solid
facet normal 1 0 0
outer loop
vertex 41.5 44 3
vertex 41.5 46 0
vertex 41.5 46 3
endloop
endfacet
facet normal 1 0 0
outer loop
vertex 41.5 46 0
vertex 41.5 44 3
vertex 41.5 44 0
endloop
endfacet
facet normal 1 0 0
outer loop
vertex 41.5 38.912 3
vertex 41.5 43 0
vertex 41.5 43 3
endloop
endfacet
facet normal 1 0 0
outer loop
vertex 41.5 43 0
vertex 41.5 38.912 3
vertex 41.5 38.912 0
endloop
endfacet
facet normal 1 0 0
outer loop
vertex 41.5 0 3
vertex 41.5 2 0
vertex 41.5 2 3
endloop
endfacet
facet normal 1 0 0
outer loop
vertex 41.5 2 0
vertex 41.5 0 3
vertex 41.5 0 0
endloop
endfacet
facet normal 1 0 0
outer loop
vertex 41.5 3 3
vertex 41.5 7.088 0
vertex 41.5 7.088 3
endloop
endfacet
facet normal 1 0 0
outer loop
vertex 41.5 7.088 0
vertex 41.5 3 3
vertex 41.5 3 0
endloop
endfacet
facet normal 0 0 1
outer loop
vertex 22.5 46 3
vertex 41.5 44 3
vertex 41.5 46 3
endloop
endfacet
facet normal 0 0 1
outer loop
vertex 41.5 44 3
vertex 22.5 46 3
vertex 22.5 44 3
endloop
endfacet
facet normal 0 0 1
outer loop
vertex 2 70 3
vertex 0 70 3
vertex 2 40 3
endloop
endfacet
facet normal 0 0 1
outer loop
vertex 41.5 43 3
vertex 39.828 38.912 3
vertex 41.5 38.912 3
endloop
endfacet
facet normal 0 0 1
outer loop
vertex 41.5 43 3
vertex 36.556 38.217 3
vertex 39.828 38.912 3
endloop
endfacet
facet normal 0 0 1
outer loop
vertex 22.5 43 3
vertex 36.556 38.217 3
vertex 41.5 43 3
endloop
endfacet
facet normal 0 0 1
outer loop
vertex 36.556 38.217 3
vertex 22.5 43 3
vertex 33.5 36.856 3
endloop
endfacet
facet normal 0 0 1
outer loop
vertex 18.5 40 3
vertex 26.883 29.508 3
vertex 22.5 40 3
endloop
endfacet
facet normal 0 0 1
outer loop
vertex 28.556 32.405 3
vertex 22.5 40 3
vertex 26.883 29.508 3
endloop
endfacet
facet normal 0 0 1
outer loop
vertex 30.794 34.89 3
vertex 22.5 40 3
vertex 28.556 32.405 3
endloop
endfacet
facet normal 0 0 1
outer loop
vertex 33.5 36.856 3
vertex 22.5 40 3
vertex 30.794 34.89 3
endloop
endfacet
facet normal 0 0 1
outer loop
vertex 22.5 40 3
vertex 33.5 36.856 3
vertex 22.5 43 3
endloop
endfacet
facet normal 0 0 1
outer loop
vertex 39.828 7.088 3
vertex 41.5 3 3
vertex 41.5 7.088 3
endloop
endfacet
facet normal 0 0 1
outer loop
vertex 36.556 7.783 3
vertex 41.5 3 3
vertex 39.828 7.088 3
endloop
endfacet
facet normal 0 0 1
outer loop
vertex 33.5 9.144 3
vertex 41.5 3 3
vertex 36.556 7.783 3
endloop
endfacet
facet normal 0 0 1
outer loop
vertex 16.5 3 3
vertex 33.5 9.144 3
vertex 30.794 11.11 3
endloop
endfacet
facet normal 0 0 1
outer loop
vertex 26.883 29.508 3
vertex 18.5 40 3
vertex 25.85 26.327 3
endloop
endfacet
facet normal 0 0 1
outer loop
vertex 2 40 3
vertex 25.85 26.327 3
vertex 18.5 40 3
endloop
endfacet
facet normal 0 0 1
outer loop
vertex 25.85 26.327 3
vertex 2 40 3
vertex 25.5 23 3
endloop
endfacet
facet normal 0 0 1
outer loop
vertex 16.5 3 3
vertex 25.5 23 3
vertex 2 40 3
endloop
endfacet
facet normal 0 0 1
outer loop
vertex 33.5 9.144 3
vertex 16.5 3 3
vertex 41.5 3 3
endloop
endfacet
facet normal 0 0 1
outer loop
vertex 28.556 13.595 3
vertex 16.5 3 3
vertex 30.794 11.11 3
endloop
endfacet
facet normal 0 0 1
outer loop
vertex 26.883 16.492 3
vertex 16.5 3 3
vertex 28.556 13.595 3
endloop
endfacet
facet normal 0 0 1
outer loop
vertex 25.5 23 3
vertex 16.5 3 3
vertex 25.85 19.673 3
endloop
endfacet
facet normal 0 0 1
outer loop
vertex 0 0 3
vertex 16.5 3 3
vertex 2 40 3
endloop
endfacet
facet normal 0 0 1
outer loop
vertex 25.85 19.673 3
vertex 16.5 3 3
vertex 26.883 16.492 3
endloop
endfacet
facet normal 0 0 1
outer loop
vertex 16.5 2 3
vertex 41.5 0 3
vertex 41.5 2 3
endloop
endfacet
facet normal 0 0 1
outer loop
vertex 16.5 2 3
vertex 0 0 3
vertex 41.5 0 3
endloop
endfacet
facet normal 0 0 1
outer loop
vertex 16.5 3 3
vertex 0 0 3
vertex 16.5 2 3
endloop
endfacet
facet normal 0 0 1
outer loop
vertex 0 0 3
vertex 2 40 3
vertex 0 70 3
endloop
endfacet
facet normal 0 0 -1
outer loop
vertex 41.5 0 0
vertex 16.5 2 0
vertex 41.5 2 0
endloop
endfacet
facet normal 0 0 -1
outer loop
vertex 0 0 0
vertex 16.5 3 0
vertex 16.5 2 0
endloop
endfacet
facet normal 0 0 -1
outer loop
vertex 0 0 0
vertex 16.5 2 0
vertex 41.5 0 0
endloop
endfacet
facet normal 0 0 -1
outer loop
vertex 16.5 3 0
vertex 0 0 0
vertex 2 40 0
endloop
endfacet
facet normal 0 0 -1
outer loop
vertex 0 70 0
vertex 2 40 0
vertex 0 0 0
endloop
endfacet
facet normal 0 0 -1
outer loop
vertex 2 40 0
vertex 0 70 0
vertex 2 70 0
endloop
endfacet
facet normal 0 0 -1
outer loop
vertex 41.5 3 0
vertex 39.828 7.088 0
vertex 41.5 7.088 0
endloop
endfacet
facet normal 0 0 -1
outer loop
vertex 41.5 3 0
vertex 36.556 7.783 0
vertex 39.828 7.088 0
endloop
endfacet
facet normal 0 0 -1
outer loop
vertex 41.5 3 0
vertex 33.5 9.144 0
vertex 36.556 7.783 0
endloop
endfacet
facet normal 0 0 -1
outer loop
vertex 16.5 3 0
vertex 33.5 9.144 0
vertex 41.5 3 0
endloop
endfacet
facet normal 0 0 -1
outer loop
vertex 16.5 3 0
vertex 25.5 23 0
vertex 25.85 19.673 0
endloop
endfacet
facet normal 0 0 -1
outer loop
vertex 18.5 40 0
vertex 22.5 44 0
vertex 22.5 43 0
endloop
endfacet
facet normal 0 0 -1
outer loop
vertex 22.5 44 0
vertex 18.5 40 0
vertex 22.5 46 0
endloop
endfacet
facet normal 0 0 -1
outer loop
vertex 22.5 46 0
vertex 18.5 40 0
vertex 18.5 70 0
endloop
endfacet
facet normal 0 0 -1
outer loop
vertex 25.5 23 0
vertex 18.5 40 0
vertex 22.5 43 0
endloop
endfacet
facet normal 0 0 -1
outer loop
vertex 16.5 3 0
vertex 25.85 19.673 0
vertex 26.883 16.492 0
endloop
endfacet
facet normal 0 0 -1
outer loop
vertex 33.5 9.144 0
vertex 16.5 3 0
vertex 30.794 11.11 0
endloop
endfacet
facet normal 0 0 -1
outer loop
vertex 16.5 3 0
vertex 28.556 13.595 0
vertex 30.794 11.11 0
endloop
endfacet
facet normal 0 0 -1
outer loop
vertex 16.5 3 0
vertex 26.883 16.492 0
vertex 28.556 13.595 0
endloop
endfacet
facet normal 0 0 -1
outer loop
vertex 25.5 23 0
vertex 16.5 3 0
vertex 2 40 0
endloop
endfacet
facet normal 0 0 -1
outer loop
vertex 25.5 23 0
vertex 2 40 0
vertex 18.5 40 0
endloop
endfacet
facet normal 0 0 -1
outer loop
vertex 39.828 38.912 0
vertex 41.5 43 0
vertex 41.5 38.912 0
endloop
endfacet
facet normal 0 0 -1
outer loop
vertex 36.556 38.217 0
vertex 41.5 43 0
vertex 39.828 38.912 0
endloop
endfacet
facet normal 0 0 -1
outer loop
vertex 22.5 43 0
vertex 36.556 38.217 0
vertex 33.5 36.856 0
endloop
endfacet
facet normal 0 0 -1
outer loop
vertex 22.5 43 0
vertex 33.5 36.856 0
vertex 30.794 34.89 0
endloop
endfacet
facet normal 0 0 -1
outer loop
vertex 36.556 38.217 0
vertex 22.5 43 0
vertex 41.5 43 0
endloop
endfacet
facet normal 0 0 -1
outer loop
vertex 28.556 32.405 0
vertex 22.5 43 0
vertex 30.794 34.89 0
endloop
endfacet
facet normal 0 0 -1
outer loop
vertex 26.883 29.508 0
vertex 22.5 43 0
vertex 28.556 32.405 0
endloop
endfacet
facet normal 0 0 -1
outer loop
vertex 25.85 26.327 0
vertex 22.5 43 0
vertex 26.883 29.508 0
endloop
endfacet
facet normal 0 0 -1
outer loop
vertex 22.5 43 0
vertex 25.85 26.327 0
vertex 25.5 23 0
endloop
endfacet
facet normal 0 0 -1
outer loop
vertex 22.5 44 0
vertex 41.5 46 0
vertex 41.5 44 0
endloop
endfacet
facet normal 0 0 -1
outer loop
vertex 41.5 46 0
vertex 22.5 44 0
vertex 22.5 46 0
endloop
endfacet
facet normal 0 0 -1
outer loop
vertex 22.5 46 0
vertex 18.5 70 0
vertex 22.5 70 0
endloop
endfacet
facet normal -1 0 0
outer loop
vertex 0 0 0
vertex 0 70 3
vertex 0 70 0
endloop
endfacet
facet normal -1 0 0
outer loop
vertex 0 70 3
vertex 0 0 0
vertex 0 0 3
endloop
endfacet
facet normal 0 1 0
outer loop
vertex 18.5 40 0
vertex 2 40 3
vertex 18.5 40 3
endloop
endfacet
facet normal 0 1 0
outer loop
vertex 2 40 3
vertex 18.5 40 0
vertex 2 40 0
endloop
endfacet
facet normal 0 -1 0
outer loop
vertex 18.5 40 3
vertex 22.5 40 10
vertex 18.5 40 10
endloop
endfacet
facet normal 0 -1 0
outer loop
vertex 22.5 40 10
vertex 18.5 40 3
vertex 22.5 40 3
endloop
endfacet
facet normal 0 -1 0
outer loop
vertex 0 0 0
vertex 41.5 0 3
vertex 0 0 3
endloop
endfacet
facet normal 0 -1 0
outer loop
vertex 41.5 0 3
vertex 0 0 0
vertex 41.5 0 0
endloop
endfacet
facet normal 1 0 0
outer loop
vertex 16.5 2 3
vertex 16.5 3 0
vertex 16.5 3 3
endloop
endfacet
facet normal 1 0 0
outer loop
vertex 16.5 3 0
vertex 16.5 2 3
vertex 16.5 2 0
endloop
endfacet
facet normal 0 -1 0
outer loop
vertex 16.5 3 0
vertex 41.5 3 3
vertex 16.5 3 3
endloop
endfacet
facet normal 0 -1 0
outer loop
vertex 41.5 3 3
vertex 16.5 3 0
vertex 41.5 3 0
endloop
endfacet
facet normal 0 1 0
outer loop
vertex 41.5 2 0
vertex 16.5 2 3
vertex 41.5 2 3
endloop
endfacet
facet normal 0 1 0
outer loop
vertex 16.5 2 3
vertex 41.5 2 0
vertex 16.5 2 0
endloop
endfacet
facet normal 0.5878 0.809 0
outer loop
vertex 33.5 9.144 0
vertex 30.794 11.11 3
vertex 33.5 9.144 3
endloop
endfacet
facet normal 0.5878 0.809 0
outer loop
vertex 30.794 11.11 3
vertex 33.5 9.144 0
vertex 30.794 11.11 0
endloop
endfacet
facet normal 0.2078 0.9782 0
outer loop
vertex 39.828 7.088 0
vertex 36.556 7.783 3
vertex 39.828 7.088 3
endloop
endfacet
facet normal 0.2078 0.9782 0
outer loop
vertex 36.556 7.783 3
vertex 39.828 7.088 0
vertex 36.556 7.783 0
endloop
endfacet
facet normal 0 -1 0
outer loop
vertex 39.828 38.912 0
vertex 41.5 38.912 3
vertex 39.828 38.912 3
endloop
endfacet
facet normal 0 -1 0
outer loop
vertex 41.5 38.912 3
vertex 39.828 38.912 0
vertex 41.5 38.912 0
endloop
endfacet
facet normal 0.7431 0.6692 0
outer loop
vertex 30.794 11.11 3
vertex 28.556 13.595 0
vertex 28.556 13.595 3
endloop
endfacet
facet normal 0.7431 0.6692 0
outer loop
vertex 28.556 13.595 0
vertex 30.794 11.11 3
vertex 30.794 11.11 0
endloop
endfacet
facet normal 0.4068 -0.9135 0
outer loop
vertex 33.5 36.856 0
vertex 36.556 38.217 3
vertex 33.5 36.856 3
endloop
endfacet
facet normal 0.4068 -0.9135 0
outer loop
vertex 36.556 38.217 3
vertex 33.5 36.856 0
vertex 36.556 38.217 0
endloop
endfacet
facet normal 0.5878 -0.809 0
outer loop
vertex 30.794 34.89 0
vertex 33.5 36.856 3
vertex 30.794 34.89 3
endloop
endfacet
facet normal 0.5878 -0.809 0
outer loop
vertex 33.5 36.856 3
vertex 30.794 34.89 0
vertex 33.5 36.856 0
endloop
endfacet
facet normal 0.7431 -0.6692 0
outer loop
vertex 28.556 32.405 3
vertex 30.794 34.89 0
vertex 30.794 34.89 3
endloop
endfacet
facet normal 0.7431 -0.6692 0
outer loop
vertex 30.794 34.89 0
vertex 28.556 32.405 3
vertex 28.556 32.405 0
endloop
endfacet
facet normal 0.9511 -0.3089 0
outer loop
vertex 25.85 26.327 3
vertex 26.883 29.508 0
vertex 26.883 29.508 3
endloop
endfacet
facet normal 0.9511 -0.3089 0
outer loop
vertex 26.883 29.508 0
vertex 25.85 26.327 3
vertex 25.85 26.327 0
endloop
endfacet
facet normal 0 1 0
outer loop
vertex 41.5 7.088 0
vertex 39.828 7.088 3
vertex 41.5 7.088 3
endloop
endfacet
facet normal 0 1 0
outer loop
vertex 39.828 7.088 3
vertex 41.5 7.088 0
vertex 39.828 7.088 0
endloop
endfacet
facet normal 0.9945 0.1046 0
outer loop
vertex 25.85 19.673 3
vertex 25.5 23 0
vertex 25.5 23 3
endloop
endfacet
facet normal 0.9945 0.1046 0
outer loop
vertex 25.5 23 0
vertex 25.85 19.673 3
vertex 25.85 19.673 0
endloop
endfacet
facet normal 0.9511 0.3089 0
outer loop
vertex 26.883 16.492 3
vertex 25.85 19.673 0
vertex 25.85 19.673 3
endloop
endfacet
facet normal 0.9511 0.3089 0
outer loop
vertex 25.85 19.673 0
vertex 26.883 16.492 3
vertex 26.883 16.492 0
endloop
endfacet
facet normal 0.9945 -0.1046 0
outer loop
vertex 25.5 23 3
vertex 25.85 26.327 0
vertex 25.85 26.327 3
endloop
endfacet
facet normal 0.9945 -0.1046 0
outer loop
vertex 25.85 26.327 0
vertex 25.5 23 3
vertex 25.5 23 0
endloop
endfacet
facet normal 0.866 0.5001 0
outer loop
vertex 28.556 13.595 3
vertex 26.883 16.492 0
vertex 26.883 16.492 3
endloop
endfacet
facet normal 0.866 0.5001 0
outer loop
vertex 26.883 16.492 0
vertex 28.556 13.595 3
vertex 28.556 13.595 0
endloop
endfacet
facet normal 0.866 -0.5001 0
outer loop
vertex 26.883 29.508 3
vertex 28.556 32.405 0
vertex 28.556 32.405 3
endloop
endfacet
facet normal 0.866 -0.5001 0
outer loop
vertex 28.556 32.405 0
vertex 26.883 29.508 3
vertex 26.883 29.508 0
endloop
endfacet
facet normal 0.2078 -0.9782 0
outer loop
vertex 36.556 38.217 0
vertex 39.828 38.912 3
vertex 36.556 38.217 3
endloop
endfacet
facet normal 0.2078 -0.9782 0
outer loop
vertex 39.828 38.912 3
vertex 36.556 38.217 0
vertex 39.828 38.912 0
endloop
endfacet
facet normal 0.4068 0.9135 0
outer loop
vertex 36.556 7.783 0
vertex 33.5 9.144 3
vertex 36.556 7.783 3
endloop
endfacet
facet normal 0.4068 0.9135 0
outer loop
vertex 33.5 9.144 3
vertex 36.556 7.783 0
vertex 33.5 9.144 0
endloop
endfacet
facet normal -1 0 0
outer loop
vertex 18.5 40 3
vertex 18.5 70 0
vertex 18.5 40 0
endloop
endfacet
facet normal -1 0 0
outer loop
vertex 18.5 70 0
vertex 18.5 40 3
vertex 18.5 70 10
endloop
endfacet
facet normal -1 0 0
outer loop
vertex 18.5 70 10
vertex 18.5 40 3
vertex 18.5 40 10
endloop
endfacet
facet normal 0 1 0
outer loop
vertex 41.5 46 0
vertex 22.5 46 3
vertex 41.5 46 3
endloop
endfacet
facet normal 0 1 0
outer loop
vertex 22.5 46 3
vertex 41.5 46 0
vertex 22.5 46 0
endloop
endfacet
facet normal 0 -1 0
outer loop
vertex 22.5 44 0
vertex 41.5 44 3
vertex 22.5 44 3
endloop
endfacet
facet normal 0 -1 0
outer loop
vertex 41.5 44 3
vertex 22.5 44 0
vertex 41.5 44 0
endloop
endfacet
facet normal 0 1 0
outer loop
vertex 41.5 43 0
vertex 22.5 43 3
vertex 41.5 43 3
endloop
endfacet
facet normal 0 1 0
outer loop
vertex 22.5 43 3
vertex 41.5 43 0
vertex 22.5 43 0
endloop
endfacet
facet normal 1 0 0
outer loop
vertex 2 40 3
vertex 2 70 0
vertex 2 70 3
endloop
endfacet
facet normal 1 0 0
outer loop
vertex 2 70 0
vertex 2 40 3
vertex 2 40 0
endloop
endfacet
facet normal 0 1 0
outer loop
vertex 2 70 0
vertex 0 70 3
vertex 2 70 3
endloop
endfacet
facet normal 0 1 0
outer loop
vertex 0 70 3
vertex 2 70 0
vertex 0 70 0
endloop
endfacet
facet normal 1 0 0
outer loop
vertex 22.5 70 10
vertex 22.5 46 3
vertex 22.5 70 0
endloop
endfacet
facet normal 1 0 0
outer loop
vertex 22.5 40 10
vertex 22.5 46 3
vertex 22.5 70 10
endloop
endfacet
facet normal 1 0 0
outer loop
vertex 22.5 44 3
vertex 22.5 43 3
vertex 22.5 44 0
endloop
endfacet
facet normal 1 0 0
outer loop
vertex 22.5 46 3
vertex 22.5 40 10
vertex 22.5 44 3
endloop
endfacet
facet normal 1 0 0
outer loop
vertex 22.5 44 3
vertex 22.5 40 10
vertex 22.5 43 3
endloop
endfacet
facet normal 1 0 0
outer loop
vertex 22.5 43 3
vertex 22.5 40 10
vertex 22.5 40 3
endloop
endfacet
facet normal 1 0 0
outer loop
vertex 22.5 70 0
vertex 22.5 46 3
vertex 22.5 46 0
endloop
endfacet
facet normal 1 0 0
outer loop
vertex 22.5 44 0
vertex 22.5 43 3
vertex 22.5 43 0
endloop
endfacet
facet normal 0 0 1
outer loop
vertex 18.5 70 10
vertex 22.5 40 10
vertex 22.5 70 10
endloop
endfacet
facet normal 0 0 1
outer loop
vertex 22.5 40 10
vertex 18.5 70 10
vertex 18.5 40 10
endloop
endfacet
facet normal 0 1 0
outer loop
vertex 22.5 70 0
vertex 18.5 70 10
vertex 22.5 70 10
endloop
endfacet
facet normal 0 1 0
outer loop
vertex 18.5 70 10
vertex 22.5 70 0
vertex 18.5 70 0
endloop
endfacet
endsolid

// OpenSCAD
//table thickness in mm
t=16.5;

translate([0,0,0])cube([2,70,3]);
difference() {
	cube([t+25,40,3]);
	translate([t,2,-1])cube([31,1,5]);
	translate([t+25,23,-1])cylinder(r=16,h=5);
}
translate([t+2,40,0]) cube([4,30,10]);
difference() {
	translate([t+2,40,0]) cube([23,6,3]);
	translate([t+5,43,-1])cube([30,1,5]);

}
